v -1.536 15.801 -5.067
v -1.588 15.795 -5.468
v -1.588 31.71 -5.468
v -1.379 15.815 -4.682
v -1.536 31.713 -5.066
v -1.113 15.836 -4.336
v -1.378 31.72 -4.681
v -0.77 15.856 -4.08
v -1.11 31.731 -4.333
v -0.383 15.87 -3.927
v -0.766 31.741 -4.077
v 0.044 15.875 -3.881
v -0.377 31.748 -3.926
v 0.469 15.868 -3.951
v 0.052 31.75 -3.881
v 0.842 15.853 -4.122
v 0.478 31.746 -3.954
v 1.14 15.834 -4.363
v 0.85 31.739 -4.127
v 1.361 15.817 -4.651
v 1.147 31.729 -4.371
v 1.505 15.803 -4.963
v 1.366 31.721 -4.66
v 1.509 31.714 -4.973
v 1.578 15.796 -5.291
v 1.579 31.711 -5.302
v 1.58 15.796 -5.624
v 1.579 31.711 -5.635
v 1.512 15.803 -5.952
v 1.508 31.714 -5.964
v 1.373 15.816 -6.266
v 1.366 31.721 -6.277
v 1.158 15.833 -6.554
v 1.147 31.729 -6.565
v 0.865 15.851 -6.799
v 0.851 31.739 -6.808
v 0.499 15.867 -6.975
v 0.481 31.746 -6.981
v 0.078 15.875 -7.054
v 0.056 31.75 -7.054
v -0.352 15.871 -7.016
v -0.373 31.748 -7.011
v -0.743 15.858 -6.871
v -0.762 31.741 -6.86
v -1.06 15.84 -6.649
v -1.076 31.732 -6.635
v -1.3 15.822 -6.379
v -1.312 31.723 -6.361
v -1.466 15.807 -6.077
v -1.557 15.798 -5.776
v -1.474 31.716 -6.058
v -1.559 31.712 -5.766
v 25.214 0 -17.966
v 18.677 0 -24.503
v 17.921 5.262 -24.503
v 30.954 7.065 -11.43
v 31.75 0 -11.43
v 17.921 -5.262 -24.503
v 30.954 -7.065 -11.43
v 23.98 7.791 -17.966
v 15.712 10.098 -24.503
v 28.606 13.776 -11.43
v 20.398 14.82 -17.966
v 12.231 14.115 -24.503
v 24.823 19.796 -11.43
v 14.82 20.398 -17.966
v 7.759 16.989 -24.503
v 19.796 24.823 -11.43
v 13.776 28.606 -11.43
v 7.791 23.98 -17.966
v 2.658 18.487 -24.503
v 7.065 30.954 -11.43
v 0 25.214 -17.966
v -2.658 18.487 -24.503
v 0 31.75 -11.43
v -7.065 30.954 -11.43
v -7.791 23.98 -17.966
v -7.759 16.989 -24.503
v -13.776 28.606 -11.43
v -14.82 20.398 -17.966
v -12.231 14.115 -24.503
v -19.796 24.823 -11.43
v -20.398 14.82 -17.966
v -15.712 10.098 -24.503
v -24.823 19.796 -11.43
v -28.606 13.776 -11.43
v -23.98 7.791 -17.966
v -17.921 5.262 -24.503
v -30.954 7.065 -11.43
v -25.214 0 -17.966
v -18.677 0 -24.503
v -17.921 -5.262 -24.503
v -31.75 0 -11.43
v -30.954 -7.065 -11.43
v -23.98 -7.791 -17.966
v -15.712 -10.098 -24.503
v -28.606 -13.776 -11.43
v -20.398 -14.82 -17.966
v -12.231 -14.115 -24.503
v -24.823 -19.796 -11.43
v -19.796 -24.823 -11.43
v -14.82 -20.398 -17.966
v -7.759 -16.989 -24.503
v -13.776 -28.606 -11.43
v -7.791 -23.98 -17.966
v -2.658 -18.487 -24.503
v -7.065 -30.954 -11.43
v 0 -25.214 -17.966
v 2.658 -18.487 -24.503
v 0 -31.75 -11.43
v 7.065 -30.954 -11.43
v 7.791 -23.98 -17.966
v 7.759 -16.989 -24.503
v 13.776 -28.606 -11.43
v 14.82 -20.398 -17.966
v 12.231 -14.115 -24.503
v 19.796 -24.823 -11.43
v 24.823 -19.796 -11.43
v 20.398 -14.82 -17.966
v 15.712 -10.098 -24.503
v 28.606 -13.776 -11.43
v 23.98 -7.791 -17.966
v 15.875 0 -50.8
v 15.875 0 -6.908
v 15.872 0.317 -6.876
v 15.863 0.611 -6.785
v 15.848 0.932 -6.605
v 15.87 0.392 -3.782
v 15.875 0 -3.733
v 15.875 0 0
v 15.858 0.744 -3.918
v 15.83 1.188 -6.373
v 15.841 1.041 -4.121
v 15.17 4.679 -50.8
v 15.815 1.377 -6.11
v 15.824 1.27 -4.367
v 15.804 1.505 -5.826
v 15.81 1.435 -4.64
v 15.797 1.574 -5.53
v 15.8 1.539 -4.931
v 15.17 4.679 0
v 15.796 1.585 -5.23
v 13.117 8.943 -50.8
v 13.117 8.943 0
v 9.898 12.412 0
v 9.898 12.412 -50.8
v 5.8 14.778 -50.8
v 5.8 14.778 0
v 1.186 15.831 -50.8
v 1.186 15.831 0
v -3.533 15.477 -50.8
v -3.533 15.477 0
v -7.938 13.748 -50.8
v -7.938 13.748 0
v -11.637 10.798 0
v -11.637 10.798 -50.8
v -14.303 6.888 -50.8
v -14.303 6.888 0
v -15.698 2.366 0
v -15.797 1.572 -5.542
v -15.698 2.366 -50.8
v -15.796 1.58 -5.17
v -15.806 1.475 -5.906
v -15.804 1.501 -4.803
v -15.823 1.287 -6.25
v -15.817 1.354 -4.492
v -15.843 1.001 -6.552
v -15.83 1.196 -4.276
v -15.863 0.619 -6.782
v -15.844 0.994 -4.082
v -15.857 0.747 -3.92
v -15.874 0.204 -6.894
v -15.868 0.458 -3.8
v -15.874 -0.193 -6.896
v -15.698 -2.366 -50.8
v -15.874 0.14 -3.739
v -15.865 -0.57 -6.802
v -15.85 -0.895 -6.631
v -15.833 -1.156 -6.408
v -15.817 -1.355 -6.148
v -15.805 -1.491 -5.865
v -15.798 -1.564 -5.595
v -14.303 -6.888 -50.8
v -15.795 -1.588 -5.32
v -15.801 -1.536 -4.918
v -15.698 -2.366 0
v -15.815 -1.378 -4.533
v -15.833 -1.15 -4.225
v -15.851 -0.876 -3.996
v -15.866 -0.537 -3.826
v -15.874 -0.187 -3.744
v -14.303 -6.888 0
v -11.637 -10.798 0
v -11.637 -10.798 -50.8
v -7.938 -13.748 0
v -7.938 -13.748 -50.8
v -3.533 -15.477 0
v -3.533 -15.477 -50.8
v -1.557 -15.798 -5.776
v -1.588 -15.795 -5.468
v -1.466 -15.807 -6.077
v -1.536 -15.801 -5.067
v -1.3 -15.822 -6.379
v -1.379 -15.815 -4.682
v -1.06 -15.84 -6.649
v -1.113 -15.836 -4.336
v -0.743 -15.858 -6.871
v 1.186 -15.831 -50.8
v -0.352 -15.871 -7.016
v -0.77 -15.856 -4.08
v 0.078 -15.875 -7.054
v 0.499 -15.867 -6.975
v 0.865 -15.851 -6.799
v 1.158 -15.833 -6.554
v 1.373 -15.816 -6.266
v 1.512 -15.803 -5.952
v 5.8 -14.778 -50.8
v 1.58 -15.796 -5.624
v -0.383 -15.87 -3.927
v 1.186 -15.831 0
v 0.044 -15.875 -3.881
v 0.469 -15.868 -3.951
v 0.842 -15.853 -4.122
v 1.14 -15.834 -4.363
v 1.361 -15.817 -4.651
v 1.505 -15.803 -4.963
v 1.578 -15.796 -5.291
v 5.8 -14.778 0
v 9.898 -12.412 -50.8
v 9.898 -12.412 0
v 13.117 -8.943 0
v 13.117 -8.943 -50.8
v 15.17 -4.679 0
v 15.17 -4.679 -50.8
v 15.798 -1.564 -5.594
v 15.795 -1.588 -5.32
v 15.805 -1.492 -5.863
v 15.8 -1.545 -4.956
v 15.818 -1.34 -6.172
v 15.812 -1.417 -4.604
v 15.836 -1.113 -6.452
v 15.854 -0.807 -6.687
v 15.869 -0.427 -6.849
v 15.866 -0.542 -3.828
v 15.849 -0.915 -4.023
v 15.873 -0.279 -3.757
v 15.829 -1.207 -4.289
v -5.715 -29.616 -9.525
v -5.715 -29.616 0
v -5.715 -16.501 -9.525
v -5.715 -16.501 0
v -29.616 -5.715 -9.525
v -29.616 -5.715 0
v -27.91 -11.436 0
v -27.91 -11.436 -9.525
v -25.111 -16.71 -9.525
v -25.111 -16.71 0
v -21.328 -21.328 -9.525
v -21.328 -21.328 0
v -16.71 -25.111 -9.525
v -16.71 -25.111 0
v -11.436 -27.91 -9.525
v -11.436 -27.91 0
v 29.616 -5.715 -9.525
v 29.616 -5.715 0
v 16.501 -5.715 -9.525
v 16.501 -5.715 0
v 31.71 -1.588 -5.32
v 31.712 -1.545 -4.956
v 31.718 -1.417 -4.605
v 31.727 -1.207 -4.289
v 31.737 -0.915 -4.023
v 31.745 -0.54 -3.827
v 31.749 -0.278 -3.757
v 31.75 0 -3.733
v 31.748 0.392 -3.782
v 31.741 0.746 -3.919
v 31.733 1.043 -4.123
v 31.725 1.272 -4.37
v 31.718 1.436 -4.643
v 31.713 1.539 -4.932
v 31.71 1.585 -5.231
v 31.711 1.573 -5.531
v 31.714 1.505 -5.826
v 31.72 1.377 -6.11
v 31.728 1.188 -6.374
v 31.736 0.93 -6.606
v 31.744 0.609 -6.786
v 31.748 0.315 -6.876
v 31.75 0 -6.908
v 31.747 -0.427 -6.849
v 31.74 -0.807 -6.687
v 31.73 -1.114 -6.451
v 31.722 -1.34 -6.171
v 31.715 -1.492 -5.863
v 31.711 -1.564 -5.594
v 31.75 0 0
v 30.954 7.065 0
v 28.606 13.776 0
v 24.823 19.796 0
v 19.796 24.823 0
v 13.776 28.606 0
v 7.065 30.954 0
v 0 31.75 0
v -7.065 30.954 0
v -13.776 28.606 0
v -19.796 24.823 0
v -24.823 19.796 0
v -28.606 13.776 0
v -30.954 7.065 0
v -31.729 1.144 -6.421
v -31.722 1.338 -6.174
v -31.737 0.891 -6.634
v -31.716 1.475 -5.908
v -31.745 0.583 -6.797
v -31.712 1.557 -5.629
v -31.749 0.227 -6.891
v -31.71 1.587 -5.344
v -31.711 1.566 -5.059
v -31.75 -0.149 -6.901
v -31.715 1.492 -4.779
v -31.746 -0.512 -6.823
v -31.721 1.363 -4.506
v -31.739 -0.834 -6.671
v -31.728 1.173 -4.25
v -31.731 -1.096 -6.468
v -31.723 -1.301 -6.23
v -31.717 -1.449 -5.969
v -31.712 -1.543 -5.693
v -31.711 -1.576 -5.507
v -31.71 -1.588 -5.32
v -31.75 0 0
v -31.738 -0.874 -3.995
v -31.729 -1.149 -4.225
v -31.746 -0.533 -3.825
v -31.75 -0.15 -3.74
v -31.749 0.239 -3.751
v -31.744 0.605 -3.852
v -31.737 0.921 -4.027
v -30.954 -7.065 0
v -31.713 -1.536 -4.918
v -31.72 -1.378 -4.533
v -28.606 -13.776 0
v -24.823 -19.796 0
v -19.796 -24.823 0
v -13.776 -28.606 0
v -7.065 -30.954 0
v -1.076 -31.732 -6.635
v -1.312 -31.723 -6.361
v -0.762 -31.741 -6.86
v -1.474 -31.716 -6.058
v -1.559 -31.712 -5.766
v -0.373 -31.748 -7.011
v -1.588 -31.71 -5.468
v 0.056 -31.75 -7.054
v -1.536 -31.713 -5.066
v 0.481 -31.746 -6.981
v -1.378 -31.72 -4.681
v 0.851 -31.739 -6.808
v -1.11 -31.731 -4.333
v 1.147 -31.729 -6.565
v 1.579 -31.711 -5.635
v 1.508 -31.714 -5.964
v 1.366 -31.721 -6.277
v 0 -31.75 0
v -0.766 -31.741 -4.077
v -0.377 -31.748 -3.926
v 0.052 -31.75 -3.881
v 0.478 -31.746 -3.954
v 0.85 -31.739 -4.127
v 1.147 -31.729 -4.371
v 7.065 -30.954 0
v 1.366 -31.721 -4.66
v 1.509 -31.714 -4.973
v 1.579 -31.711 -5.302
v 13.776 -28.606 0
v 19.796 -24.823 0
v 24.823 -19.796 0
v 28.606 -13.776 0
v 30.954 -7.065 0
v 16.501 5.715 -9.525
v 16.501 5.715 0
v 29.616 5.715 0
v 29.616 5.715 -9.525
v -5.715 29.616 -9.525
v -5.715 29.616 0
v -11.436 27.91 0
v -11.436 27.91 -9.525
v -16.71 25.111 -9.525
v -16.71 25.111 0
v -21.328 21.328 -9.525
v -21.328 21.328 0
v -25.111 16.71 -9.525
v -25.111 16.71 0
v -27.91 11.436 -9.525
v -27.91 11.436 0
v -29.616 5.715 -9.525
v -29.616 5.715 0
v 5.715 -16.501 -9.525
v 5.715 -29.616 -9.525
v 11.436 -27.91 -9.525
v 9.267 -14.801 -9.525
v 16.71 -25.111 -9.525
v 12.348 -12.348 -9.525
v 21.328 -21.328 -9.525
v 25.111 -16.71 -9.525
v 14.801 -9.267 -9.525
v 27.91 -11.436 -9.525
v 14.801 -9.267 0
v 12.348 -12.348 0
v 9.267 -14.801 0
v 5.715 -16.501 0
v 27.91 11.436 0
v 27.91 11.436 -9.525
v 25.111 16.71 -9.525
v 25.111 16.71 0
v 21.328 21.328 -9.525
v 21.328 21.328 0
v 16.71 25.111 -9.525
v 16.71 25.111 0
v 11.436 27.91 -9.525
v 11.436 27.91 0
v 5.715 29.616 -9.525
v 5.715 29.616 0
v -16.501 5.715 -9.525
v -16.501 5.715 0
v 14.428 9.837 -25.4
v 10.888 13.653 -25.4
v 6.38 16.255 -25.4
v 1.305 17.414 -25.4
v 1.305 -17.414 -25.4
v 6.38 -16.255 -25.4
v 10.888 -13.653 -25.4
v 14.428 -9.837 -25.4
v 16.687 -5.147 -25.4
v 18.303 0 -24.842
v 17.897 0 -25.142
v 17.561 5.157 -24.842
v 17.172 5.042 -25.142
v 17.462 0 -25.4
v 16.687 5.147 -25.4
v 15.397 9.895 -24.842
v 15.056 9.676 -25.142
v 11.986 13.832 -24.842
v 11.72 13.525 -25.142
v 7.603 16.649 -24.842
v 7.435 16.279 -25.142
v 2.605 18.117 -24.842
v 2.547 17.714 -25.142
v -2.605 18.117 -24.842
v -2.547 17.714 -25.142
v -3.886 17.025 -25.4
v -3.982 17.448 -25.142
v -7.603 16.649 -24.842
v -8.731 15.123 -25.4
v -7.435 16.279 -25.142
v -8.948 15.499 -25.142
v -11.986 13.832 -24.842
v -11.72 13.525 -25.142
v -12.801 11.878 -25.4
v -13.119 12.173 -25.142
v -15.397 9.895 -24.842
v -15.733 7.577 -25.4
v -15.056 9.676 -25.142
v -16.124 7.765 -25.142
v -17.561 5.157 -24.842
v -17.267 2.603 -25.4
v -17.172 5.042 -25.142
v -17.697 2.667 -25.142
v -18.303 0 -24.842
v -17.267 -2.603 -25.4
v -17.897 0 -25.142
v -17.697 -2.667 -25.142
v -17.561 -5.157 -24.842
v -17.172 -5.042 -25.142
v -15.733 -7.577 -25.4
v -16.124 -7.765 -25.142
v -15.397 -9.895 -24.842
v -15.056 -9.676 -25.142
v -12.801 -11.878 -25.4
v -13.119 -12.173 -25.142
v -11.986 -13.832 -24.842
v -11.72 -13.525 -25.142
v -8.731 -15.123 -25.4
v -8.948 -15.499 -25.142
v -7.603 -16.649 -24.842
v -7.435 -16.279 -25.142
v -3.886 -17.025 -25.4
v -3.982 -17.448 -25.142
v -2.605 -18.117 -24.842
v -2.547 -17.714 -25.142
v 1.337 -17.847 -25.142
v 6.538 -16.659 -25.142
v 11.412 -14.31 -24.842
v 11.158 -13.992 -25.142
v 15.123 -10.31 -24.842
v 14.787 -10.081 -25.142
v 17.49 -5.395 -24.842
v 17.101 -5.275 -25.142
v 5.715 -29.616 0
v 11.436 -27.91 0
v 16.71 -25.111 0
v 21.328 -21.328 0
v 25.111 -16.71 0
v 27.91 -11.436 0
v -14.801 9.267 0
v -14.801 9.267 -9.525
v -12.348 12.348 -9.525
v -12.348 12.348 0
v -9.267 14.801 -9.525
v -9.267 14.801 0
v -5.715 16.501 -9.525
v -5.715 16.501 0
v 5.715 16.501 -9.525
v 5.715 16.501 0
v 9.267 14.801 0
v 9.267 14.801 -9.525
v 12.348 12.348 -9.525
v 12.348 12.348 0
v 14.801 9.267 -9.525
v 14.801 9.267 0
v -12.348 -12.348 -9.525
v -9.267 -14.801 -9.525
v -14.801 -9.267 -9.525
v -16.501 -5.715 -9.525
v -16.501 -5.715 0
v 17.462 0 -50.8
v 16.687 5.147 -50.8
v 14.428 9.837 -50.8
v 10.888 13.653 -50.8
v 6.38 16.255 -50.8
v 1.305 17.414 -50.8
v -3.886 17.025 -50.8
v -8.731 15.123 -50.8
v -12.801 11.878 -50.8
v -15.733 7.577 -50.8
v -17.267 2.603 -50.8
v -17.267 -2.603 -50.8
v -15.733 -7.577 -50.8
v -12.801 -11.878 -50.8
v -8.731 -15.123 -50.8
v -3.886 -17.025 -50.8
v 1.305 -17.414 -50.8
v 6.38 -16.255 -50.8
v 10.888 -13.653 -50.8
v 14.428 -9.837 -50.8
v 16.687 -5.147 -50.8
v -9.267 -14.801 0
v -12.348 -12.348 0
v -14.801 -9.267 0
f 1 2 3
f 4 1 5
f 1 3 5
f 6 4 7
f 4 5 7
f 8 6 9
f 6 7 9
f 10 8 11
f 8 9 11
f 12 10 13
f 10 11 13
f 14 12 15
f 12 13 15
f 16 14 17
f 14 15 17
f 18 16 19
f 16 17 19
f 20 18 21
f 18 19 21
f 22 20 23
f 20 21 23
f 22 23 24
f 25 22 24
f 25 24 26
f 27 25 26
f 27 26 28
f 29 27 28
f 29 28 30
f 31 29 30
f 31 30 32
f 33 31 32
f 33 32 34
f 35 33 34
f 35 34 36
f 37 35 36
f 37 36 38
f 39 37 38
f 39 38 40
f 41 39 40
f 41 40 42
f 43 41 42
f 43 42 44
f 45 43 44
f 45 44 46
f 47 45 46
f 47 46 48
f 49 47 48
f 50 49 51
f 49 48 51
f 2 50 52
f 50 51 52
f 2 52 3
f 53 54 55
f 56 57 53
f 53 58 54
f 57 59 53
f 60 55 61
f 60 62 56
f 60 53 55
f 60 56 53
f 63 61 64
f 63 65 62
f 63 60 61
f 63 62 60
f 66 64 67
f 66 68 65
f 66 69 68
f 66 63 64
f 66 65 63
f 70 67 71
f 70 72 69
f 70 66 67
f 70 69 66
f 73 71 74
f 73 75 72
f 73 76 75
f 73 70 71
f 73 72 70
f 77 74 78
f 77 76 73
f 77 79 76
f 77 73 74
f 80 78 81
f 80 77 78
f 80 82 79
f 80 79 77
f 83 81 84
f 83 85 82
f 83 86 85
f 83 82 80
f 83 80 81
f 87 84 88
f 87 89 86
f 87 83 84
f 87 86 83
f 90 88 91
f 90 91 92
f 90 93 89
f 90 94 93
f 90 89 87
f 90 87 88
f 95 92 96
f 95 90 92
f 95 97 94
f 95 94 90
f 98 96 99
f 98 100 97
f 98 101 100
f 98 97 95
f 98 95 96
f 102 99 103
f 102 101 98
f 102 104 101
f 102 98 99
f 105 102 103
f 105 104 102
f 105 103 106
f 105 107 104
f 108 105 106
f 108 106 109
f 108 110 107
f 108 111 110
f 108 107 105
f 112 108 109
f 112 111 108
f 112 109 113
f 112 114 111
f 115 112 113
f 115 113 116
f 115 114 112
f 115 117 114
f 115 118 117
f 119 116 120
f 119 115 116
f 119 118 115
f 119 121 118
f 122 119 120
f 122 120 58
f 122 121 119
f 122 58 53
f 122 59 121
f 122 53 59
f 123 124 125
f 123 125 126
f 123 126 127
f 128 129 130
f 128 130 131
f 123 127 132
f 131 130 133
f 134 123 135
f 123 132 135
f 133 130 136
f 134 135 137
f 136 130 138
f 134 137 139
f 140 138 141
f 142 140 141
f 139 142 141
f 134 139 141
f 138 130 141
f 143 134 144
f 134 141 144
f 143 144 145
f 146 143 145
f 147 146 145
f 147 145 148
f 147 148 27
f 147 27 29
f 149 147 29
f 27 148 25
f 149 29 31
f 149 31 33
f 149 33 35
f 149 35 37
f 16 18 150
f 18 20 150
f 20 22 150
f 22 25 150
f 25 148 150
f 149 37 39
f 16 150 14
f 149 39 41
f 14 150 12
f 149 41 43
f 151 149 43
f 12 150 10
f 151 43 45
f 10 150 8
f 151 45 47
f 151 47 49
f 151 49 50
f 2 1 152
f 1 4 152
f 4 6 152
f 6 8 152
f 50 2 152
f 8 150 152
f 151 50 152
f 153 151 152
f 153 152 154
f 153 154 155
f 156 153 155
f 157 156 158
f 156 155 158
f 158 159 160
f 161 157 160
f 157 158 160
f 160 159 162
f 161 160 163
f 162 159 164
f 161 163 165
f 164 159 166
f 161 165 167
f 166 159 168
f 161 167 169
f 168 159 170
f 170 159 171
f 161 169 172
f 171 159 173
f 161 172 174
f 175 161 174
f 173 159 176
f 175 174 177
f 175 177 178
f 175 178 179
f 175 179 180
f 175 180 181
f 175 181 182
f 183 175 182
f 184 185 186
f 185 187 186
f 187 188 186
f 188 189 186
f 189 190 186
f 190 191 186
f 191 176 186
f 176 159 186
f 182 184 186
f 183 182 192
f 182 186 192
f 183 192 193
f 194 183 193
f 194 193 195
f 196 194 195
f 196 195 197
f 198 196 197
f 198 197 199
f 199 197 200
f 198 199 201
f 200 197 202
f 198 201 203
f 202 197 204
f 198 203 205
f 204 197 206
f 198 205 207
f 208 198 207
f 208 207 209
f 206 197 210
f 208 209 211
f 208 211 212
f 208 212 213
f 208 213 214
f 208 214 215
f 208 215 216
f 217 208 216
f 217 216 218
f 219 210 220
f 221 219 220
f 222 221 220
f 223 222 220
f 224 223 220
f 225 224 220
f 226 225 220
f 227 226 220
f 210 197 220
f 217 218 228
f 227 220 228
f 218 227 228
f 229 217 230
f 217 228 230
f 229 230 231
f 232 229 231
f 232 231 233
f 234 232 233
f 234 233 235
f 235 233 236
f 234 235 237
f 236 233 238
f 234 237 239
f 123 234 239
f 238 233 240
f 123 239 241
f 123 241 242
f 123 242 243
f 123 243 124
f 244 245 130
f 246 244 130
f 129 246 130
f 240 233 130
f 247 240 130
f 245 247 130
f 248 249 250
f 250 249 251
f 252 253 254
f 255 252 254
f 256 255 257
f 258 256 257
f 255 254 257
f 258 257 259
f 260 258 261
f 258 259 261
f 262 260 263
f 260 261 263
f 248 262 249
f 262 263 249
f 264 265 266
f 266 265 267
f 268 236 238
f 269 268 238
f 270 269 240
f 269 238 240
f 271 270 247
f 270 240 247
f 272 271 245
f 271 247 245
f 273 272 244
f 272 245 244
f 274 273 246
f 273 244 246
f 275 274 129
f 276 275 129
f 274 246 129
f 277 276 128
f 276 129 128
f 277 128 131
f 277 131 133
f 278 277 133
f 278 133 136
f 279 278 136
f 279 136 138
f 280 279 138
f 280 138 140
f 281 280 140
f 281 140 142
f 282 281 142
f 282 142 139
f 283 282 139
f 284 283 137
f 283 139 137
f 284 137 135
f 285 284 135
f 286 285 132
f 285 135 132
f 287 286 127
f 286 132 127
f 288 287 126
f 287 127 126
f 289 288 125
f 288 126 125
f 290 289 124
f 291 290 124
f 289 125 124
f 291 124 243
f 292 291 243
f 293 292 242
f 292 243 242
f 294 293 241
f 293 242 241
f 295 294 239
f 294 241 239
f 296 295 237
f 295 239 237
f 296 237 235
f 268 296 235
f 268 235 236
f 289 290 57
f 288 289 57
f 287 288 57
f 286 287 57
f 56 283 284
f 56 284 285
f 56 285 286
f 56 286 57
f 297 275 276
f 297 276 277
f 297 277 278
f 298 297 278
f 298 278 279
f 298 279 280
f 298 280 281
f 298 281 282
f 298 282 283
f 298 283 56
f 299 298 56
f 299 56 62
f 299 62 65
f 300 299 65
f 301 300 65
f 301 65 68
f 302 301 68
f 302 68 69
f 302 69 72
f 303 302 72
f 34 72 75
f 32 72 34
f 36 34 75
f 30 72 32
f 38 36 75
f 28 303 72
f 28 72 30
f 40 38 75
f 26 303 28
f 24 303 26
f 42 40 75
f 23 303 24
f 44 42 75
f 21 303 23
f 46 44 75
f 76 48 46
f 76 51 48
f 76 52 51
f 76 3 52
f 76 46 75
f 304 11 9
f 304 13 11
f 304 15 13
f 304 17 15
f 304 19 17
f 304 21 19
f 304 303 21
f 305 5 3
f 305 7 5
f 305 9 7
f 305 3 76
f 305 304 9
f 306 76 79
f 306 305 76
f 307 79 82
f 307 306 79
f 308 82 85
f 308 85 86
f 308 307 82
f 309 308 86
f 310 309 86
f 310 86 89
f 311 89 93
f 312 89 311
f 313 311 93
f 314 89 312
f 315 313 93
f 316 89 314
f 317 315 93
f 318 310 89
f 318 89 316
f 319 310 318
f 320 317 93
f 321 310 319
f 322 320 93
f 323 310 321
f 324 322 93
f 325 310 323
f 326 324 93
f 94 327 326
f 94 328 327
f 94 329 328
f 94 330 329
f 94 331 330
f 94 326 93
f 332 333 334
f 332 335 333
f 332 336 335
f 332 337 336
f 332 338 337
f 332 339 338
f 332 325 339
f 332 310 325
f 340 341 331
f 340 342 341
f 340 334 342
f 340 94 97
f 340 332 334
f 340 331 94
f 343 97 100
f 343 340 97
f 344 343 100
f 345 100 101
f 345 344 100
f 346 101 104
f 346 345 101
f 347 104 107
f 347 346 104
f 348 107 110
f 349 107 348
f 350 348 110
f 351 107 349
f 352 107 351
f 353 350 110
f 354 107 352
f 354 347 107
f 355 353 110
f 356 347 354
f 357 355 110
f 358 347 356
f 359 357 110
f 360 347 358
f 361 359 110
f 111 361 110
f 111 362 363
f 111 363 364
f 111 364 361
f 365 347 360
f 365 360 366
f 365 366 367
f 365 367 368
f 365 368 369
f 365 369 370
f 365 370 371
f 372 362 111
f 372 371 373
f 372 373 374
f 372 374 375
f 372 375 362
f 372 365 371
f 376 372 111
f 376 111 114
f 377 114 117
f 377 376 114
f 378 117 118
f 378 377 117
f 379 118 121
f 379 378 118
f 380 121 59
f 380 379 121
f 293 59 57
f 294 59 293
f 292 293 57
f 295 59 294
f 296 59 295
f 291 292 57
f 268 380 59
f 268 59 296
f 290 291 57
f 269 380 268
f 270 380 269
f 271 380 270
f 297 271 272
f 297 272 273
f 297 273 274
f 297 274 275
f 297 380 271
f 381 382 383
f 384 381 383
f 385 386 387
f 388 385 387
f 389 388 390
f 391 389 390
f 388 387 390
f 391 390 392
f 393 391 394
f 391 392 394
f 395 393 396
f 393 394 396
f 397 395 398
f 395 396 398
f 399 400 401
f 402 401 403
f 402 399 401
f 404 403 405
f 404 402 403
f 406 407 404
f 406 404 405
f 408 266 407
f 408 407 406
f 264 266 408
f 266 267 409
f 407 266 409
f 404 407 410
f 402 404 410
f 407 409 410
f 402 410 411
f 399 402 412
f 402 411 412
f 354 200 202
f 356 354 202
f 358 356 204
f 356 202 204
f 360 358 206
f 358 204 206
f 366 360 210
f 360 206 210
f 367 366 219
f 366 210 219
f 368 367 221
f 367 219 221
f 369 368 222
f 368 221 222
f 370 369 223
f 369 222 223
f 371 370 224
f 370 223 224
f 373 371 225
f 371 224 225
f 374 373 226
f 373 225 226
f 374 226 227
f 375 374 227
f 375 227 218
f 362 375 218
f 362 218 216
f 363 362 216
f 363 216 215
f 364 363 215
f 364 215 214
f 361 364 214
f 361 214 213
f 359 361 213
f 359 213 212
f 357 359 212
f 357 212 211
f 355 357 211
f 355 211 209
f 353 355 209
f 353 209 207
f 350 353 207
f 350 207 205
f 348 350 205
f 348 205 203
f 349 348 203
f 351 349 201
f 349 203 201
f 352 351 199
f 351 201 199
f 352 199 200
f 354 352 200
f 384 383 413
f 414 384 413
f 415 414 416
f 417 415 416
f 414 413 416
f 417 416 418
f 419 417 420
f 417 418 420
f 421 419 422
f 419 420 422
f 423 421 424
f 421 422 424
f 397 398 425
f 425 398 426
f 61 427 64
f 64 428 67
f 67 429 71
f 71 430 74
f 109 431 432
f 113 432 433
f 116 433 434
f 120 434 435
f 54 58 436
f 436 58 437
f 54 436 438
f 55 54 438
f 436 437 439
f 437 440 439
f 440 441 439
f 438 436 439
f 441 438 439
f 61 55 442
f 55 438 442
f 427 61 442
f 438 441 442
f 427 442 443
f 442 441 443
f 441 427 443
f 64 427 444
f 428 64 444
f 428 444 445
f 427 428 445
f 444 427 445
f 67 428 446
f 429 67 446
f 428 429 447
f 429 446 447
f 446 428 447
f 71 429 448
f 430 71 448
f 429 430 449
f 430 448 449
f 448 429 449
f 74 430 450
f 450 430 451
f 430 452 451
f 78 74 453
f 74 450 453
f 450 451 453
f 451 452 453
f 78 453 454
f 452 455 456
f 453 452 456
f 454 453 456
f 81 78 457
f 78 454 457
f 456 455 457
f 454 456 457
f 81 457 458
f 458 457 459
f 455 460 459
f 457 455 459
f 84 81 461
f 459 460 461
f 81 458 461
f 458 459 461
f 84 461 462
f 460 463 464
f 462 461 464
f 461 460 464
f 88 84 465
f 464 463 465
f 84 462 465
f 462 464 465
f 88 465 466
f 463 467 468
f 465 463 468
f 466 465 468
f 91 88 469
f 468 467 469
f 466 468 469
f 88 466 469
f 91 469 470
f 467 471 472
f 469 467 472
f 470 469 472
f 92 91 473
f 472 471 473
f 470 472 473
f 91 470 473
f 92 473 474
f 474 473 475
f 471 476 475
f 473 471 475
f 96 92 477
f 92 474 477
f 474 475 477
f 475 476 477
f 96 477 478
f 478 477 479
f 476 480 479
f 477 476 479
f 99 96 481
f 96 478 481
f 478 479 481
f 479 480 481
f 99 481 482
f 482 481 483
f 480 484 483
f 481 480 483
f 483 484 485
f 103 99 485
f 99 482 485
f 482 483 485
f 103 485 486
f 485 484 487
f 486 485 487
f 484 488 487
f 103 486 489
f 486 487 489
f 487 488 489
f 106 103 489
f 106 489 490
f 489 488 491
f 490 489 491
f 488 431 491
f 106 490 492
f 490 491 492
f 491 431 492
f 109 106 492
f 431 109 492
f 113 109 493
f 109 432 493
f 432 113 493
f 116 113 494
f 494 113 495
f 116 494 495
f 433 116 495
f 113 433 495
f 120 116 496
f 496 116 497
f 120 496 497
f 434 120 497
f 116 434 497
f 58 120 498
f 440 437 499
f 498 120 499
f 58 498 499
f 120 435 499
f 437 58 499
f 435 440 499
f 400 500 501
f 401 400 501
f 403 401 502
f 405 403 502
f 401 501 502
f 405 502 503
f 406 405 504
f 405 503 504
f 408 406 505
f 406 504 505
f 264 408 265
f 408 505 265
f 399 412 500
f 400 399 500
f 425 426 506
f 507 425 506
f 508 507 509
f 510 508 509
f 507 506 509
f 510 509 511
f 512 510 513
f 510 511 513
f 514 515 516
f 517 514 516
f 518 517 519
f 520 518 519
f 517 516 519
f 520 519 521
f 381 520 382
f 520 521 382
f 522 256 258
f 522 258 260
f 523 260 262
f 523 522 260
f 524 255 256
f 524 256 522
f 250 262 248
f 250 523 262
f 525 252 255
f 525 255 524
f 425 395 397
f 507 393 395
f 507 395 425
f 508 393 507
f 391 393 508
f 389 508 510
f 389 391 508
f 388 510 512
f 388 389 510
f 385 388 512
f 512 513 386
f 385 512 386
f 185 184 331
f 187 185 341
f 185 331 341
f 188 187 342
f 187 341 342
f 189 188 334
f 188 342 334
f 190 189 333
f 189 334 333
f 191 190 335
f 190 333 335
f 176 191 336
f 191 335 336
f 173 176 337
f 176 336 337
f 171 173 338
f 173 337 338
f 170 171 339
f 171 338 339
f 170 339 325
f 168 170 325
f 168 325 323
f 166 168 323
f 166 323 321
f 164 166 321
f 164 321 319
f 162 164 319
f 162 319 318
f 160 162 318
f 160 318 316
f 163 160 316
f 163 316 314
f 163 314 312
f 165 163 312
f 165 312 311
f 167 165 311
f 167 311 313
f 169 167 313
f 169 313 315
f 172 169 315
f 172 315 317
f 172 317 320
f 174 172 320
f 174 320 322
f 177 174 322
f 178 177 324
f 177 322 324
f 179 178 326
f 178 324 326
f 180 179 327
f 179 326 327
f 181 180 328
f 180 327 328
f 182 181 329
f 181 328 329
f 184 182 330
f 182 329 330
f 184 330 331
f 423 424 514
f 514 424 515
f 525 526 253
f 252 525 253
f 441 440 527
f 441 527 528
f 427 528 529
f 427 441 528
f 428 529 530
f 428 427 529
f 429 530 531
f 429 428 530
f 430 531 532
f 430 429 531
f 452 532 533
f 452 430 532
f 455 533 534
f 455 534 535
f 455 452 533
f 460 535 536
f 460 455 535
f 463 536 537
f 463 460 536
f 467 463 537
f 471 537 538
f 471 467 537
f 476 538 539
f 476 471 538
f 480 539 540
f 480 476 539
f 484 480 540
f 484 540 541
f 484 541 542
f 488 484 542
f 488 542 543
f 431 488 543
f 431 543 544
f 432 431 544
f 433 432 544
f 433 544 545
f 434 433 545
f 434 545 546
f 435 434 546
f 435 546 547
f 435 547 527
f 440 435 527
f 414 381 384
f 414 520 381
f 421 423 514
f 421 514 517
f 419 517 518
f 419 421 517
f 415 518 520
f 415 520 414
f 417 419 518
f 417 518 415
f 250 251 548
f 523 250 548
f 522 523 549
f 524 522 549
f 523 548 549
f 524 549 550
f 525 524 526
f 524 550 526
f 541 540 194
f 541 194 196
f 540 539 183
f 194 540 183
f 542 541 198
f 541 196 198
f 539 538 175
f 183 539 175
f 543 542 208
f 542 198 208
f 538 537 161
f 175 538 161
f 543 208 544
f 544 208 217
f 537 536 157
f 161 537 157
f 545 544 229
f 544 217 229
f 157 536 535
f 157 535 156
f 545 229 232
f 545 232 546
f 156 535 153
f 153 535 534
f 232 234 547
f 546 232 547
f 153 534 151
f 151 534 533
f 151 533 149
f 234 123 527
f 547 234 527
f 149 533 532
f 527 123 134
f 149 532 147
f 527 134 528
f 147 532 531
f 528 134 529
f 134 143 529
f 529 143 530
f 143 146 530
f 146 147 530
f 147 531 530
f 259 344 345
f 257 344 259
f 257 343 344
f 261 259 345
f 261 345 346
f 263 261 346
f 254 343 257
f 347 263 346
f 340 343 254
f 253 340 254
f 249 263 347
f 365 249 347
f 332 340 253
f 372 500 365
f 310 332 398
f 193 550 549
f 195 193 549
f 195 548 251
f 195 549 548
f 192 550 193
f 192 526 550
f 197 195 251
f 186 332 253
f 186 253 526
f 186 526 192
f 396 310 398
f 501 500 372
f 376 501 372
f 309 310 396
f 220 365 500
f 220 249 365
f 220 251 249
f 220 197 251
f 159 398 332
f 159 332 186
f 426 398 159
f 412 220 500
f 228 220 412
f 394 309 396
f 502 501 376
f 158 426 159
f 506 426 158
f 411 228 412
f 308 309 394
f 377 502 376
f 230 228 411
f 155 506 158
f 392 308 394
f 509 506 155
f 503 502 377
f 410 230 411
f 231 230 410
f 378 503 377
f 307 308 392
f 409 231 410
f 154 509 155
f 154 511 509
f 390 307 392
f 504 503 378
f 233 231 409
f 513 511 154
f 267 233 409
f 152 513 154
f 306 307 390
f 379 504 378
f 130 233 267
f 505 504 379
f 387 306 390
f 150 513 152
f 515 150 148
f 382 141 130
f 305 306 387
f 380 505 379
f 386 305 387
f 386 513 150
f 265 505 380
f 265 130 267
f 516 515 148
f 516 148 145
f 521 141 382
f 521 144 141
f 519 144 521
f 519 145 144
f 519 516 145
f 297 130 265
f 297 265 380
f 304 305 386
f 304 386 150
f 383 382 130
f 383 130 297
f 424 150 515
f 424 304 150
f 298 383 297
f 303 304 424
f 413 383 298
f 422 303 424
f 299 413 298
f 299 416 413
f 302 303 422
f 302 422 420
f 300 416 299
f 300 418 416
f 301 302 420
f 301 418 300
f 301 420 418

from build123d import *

# Parameters (mm, degrees)
F0_R     = 31.75
F0_R_2   = 17.4625
F1_DEPTH = 25.4
F0_R_3   = 15.875
F2_DEPTH = 50.8
F3_SIZE  = 13.97
F6_DEPTH = 9.525
F10_D    = 3.175
F13_D    = 3.175


# Not quite as in the source:
# - a fillet or chamfer that OpenCascade refuses, or shapes differently, is made with other operations: its cross-section is extruded or revolved along the edge and cut away or added


with BuildPart() as f1:
    # F0 (on Top) → F1 (new body)
    with BuildSketch(Plane.XY):
        Circle(F0_R)
        Circle(F0_R_2, mode=Mode.SUBTRACT)
    extrude(amount=-F1_DEPTH)

    # F0 (on Top) → F2 (join)
    with BuildSketch(Plane.XY):
        Circle(F0_R_2)
        Circle(F0_R_3, mode=Mode.SUBTRACT)
    extrude(amount=-F2_DEPTH)

    # F3
    f3_edges = [f1.edges().sort_by_distance(p)[0] for p in [
        (-31.75, 0, -25.4),
    ]]
    chamfer(f3_edges, length=F3_SIZE)

    # F4: fillet of radius 5.08 on 1 edges, made by hand

    # F4_s1 → F4_t2 (revolve, cut)
    with BuildSketch(Plane.XZ):
        with BuildLine():
            ThreePointArc((18.677323371, -24.502676629), (18.1034449464, -24.9967366519), (17.4625, -25.4))
            Line((17.4625, -25.4), (17.78, -25.4))
            Line((17.78, -25.4), (18.677323371, -24.502676629))
        make_face()
    revolve(axis=Axis((0, 0, -25.4), (0, 0, 1)), mode=Mode.SUBTRACT)

    # F5 (on Top) → F6 (cut)
    with BuildSketch(Plane.XY):
        with BuildLine():
            ThreePointArc((-5.715, 29.6161304233), (-21.3281082875, 21.3281082875), (-29.6161304233, 5.715))
            Line((-29.6161304233, 5.715), (-16.5008388044, 5.715))
            ThreePointArc((-16.5008388044, 5.715), (-12.3478521665, 12.3478521665), (-5.715, 16.5008388044))
            Line((-5.715, 16.5008388044), (-5.715, 29.6161304233))
        make_face()
        with BuildLine():
            ThreePointArc((-29.6161304233, -5.715), (-21.3281082875, -21.3281082875), (-5.715, -29.6161304233))
            Line((-5.715, -29.6161304233), (-5.715, -16.5008388044))
            ThreePointArc((-5.715, -16.5008388044), (-12.3478521665, -12.3478521665), (-16.5008388044, -5.715))
            Line((-16.5008388044, -5.715), (-29.6161304233, -5.715))
        make_face()
        with BuildLine():
            Line((5.715, -16.5008388044), (5.715, -29.6161304233))
            ThreePointArc((5.715, -29.6161304233), (21.3281082875, -21.3281082875), (29.6161304233, -5.715))
            Line((29.6161304233, -5.715), (16.5008388044, -5.715))
            ThreePointArc((16.5008388044, -5.715), (12.3478521665, -12.3478521665), (5.715, -16.5008388044))
        make_face()
        with BuildLine():
            Line((16.5008388044, 5.715), (29.6161304233, 5.715))
            ThreePointArc((29.6161304233, 5.715), (21.3281082875, 21.3281082875), (5.715, 29.6161304233))
            Line((5.715, 29.6161304233), (5.715, 16.5008388044))
            ThreePointArc((5.715, 16.5008388044), (12.3478521665, 12.3478521665), (16.5008388044, 5.715))
        make_face()
    extrude(amount=-F6_DEPTH, mode=Mode.SUBTRACT)

    # F10 (through all)
    with Locations(Plane.XZ.offset(50.8)):
        with Locations((0, -5.4679759778)):
            Hole(F10_D / 2)

    # F13 (through all)
    with Locations(Plane.YZ.offset(50.8)):
        with Locations((0, -5.3200940602)):
            Hole(F13_D / 2)


solid = f1.part
